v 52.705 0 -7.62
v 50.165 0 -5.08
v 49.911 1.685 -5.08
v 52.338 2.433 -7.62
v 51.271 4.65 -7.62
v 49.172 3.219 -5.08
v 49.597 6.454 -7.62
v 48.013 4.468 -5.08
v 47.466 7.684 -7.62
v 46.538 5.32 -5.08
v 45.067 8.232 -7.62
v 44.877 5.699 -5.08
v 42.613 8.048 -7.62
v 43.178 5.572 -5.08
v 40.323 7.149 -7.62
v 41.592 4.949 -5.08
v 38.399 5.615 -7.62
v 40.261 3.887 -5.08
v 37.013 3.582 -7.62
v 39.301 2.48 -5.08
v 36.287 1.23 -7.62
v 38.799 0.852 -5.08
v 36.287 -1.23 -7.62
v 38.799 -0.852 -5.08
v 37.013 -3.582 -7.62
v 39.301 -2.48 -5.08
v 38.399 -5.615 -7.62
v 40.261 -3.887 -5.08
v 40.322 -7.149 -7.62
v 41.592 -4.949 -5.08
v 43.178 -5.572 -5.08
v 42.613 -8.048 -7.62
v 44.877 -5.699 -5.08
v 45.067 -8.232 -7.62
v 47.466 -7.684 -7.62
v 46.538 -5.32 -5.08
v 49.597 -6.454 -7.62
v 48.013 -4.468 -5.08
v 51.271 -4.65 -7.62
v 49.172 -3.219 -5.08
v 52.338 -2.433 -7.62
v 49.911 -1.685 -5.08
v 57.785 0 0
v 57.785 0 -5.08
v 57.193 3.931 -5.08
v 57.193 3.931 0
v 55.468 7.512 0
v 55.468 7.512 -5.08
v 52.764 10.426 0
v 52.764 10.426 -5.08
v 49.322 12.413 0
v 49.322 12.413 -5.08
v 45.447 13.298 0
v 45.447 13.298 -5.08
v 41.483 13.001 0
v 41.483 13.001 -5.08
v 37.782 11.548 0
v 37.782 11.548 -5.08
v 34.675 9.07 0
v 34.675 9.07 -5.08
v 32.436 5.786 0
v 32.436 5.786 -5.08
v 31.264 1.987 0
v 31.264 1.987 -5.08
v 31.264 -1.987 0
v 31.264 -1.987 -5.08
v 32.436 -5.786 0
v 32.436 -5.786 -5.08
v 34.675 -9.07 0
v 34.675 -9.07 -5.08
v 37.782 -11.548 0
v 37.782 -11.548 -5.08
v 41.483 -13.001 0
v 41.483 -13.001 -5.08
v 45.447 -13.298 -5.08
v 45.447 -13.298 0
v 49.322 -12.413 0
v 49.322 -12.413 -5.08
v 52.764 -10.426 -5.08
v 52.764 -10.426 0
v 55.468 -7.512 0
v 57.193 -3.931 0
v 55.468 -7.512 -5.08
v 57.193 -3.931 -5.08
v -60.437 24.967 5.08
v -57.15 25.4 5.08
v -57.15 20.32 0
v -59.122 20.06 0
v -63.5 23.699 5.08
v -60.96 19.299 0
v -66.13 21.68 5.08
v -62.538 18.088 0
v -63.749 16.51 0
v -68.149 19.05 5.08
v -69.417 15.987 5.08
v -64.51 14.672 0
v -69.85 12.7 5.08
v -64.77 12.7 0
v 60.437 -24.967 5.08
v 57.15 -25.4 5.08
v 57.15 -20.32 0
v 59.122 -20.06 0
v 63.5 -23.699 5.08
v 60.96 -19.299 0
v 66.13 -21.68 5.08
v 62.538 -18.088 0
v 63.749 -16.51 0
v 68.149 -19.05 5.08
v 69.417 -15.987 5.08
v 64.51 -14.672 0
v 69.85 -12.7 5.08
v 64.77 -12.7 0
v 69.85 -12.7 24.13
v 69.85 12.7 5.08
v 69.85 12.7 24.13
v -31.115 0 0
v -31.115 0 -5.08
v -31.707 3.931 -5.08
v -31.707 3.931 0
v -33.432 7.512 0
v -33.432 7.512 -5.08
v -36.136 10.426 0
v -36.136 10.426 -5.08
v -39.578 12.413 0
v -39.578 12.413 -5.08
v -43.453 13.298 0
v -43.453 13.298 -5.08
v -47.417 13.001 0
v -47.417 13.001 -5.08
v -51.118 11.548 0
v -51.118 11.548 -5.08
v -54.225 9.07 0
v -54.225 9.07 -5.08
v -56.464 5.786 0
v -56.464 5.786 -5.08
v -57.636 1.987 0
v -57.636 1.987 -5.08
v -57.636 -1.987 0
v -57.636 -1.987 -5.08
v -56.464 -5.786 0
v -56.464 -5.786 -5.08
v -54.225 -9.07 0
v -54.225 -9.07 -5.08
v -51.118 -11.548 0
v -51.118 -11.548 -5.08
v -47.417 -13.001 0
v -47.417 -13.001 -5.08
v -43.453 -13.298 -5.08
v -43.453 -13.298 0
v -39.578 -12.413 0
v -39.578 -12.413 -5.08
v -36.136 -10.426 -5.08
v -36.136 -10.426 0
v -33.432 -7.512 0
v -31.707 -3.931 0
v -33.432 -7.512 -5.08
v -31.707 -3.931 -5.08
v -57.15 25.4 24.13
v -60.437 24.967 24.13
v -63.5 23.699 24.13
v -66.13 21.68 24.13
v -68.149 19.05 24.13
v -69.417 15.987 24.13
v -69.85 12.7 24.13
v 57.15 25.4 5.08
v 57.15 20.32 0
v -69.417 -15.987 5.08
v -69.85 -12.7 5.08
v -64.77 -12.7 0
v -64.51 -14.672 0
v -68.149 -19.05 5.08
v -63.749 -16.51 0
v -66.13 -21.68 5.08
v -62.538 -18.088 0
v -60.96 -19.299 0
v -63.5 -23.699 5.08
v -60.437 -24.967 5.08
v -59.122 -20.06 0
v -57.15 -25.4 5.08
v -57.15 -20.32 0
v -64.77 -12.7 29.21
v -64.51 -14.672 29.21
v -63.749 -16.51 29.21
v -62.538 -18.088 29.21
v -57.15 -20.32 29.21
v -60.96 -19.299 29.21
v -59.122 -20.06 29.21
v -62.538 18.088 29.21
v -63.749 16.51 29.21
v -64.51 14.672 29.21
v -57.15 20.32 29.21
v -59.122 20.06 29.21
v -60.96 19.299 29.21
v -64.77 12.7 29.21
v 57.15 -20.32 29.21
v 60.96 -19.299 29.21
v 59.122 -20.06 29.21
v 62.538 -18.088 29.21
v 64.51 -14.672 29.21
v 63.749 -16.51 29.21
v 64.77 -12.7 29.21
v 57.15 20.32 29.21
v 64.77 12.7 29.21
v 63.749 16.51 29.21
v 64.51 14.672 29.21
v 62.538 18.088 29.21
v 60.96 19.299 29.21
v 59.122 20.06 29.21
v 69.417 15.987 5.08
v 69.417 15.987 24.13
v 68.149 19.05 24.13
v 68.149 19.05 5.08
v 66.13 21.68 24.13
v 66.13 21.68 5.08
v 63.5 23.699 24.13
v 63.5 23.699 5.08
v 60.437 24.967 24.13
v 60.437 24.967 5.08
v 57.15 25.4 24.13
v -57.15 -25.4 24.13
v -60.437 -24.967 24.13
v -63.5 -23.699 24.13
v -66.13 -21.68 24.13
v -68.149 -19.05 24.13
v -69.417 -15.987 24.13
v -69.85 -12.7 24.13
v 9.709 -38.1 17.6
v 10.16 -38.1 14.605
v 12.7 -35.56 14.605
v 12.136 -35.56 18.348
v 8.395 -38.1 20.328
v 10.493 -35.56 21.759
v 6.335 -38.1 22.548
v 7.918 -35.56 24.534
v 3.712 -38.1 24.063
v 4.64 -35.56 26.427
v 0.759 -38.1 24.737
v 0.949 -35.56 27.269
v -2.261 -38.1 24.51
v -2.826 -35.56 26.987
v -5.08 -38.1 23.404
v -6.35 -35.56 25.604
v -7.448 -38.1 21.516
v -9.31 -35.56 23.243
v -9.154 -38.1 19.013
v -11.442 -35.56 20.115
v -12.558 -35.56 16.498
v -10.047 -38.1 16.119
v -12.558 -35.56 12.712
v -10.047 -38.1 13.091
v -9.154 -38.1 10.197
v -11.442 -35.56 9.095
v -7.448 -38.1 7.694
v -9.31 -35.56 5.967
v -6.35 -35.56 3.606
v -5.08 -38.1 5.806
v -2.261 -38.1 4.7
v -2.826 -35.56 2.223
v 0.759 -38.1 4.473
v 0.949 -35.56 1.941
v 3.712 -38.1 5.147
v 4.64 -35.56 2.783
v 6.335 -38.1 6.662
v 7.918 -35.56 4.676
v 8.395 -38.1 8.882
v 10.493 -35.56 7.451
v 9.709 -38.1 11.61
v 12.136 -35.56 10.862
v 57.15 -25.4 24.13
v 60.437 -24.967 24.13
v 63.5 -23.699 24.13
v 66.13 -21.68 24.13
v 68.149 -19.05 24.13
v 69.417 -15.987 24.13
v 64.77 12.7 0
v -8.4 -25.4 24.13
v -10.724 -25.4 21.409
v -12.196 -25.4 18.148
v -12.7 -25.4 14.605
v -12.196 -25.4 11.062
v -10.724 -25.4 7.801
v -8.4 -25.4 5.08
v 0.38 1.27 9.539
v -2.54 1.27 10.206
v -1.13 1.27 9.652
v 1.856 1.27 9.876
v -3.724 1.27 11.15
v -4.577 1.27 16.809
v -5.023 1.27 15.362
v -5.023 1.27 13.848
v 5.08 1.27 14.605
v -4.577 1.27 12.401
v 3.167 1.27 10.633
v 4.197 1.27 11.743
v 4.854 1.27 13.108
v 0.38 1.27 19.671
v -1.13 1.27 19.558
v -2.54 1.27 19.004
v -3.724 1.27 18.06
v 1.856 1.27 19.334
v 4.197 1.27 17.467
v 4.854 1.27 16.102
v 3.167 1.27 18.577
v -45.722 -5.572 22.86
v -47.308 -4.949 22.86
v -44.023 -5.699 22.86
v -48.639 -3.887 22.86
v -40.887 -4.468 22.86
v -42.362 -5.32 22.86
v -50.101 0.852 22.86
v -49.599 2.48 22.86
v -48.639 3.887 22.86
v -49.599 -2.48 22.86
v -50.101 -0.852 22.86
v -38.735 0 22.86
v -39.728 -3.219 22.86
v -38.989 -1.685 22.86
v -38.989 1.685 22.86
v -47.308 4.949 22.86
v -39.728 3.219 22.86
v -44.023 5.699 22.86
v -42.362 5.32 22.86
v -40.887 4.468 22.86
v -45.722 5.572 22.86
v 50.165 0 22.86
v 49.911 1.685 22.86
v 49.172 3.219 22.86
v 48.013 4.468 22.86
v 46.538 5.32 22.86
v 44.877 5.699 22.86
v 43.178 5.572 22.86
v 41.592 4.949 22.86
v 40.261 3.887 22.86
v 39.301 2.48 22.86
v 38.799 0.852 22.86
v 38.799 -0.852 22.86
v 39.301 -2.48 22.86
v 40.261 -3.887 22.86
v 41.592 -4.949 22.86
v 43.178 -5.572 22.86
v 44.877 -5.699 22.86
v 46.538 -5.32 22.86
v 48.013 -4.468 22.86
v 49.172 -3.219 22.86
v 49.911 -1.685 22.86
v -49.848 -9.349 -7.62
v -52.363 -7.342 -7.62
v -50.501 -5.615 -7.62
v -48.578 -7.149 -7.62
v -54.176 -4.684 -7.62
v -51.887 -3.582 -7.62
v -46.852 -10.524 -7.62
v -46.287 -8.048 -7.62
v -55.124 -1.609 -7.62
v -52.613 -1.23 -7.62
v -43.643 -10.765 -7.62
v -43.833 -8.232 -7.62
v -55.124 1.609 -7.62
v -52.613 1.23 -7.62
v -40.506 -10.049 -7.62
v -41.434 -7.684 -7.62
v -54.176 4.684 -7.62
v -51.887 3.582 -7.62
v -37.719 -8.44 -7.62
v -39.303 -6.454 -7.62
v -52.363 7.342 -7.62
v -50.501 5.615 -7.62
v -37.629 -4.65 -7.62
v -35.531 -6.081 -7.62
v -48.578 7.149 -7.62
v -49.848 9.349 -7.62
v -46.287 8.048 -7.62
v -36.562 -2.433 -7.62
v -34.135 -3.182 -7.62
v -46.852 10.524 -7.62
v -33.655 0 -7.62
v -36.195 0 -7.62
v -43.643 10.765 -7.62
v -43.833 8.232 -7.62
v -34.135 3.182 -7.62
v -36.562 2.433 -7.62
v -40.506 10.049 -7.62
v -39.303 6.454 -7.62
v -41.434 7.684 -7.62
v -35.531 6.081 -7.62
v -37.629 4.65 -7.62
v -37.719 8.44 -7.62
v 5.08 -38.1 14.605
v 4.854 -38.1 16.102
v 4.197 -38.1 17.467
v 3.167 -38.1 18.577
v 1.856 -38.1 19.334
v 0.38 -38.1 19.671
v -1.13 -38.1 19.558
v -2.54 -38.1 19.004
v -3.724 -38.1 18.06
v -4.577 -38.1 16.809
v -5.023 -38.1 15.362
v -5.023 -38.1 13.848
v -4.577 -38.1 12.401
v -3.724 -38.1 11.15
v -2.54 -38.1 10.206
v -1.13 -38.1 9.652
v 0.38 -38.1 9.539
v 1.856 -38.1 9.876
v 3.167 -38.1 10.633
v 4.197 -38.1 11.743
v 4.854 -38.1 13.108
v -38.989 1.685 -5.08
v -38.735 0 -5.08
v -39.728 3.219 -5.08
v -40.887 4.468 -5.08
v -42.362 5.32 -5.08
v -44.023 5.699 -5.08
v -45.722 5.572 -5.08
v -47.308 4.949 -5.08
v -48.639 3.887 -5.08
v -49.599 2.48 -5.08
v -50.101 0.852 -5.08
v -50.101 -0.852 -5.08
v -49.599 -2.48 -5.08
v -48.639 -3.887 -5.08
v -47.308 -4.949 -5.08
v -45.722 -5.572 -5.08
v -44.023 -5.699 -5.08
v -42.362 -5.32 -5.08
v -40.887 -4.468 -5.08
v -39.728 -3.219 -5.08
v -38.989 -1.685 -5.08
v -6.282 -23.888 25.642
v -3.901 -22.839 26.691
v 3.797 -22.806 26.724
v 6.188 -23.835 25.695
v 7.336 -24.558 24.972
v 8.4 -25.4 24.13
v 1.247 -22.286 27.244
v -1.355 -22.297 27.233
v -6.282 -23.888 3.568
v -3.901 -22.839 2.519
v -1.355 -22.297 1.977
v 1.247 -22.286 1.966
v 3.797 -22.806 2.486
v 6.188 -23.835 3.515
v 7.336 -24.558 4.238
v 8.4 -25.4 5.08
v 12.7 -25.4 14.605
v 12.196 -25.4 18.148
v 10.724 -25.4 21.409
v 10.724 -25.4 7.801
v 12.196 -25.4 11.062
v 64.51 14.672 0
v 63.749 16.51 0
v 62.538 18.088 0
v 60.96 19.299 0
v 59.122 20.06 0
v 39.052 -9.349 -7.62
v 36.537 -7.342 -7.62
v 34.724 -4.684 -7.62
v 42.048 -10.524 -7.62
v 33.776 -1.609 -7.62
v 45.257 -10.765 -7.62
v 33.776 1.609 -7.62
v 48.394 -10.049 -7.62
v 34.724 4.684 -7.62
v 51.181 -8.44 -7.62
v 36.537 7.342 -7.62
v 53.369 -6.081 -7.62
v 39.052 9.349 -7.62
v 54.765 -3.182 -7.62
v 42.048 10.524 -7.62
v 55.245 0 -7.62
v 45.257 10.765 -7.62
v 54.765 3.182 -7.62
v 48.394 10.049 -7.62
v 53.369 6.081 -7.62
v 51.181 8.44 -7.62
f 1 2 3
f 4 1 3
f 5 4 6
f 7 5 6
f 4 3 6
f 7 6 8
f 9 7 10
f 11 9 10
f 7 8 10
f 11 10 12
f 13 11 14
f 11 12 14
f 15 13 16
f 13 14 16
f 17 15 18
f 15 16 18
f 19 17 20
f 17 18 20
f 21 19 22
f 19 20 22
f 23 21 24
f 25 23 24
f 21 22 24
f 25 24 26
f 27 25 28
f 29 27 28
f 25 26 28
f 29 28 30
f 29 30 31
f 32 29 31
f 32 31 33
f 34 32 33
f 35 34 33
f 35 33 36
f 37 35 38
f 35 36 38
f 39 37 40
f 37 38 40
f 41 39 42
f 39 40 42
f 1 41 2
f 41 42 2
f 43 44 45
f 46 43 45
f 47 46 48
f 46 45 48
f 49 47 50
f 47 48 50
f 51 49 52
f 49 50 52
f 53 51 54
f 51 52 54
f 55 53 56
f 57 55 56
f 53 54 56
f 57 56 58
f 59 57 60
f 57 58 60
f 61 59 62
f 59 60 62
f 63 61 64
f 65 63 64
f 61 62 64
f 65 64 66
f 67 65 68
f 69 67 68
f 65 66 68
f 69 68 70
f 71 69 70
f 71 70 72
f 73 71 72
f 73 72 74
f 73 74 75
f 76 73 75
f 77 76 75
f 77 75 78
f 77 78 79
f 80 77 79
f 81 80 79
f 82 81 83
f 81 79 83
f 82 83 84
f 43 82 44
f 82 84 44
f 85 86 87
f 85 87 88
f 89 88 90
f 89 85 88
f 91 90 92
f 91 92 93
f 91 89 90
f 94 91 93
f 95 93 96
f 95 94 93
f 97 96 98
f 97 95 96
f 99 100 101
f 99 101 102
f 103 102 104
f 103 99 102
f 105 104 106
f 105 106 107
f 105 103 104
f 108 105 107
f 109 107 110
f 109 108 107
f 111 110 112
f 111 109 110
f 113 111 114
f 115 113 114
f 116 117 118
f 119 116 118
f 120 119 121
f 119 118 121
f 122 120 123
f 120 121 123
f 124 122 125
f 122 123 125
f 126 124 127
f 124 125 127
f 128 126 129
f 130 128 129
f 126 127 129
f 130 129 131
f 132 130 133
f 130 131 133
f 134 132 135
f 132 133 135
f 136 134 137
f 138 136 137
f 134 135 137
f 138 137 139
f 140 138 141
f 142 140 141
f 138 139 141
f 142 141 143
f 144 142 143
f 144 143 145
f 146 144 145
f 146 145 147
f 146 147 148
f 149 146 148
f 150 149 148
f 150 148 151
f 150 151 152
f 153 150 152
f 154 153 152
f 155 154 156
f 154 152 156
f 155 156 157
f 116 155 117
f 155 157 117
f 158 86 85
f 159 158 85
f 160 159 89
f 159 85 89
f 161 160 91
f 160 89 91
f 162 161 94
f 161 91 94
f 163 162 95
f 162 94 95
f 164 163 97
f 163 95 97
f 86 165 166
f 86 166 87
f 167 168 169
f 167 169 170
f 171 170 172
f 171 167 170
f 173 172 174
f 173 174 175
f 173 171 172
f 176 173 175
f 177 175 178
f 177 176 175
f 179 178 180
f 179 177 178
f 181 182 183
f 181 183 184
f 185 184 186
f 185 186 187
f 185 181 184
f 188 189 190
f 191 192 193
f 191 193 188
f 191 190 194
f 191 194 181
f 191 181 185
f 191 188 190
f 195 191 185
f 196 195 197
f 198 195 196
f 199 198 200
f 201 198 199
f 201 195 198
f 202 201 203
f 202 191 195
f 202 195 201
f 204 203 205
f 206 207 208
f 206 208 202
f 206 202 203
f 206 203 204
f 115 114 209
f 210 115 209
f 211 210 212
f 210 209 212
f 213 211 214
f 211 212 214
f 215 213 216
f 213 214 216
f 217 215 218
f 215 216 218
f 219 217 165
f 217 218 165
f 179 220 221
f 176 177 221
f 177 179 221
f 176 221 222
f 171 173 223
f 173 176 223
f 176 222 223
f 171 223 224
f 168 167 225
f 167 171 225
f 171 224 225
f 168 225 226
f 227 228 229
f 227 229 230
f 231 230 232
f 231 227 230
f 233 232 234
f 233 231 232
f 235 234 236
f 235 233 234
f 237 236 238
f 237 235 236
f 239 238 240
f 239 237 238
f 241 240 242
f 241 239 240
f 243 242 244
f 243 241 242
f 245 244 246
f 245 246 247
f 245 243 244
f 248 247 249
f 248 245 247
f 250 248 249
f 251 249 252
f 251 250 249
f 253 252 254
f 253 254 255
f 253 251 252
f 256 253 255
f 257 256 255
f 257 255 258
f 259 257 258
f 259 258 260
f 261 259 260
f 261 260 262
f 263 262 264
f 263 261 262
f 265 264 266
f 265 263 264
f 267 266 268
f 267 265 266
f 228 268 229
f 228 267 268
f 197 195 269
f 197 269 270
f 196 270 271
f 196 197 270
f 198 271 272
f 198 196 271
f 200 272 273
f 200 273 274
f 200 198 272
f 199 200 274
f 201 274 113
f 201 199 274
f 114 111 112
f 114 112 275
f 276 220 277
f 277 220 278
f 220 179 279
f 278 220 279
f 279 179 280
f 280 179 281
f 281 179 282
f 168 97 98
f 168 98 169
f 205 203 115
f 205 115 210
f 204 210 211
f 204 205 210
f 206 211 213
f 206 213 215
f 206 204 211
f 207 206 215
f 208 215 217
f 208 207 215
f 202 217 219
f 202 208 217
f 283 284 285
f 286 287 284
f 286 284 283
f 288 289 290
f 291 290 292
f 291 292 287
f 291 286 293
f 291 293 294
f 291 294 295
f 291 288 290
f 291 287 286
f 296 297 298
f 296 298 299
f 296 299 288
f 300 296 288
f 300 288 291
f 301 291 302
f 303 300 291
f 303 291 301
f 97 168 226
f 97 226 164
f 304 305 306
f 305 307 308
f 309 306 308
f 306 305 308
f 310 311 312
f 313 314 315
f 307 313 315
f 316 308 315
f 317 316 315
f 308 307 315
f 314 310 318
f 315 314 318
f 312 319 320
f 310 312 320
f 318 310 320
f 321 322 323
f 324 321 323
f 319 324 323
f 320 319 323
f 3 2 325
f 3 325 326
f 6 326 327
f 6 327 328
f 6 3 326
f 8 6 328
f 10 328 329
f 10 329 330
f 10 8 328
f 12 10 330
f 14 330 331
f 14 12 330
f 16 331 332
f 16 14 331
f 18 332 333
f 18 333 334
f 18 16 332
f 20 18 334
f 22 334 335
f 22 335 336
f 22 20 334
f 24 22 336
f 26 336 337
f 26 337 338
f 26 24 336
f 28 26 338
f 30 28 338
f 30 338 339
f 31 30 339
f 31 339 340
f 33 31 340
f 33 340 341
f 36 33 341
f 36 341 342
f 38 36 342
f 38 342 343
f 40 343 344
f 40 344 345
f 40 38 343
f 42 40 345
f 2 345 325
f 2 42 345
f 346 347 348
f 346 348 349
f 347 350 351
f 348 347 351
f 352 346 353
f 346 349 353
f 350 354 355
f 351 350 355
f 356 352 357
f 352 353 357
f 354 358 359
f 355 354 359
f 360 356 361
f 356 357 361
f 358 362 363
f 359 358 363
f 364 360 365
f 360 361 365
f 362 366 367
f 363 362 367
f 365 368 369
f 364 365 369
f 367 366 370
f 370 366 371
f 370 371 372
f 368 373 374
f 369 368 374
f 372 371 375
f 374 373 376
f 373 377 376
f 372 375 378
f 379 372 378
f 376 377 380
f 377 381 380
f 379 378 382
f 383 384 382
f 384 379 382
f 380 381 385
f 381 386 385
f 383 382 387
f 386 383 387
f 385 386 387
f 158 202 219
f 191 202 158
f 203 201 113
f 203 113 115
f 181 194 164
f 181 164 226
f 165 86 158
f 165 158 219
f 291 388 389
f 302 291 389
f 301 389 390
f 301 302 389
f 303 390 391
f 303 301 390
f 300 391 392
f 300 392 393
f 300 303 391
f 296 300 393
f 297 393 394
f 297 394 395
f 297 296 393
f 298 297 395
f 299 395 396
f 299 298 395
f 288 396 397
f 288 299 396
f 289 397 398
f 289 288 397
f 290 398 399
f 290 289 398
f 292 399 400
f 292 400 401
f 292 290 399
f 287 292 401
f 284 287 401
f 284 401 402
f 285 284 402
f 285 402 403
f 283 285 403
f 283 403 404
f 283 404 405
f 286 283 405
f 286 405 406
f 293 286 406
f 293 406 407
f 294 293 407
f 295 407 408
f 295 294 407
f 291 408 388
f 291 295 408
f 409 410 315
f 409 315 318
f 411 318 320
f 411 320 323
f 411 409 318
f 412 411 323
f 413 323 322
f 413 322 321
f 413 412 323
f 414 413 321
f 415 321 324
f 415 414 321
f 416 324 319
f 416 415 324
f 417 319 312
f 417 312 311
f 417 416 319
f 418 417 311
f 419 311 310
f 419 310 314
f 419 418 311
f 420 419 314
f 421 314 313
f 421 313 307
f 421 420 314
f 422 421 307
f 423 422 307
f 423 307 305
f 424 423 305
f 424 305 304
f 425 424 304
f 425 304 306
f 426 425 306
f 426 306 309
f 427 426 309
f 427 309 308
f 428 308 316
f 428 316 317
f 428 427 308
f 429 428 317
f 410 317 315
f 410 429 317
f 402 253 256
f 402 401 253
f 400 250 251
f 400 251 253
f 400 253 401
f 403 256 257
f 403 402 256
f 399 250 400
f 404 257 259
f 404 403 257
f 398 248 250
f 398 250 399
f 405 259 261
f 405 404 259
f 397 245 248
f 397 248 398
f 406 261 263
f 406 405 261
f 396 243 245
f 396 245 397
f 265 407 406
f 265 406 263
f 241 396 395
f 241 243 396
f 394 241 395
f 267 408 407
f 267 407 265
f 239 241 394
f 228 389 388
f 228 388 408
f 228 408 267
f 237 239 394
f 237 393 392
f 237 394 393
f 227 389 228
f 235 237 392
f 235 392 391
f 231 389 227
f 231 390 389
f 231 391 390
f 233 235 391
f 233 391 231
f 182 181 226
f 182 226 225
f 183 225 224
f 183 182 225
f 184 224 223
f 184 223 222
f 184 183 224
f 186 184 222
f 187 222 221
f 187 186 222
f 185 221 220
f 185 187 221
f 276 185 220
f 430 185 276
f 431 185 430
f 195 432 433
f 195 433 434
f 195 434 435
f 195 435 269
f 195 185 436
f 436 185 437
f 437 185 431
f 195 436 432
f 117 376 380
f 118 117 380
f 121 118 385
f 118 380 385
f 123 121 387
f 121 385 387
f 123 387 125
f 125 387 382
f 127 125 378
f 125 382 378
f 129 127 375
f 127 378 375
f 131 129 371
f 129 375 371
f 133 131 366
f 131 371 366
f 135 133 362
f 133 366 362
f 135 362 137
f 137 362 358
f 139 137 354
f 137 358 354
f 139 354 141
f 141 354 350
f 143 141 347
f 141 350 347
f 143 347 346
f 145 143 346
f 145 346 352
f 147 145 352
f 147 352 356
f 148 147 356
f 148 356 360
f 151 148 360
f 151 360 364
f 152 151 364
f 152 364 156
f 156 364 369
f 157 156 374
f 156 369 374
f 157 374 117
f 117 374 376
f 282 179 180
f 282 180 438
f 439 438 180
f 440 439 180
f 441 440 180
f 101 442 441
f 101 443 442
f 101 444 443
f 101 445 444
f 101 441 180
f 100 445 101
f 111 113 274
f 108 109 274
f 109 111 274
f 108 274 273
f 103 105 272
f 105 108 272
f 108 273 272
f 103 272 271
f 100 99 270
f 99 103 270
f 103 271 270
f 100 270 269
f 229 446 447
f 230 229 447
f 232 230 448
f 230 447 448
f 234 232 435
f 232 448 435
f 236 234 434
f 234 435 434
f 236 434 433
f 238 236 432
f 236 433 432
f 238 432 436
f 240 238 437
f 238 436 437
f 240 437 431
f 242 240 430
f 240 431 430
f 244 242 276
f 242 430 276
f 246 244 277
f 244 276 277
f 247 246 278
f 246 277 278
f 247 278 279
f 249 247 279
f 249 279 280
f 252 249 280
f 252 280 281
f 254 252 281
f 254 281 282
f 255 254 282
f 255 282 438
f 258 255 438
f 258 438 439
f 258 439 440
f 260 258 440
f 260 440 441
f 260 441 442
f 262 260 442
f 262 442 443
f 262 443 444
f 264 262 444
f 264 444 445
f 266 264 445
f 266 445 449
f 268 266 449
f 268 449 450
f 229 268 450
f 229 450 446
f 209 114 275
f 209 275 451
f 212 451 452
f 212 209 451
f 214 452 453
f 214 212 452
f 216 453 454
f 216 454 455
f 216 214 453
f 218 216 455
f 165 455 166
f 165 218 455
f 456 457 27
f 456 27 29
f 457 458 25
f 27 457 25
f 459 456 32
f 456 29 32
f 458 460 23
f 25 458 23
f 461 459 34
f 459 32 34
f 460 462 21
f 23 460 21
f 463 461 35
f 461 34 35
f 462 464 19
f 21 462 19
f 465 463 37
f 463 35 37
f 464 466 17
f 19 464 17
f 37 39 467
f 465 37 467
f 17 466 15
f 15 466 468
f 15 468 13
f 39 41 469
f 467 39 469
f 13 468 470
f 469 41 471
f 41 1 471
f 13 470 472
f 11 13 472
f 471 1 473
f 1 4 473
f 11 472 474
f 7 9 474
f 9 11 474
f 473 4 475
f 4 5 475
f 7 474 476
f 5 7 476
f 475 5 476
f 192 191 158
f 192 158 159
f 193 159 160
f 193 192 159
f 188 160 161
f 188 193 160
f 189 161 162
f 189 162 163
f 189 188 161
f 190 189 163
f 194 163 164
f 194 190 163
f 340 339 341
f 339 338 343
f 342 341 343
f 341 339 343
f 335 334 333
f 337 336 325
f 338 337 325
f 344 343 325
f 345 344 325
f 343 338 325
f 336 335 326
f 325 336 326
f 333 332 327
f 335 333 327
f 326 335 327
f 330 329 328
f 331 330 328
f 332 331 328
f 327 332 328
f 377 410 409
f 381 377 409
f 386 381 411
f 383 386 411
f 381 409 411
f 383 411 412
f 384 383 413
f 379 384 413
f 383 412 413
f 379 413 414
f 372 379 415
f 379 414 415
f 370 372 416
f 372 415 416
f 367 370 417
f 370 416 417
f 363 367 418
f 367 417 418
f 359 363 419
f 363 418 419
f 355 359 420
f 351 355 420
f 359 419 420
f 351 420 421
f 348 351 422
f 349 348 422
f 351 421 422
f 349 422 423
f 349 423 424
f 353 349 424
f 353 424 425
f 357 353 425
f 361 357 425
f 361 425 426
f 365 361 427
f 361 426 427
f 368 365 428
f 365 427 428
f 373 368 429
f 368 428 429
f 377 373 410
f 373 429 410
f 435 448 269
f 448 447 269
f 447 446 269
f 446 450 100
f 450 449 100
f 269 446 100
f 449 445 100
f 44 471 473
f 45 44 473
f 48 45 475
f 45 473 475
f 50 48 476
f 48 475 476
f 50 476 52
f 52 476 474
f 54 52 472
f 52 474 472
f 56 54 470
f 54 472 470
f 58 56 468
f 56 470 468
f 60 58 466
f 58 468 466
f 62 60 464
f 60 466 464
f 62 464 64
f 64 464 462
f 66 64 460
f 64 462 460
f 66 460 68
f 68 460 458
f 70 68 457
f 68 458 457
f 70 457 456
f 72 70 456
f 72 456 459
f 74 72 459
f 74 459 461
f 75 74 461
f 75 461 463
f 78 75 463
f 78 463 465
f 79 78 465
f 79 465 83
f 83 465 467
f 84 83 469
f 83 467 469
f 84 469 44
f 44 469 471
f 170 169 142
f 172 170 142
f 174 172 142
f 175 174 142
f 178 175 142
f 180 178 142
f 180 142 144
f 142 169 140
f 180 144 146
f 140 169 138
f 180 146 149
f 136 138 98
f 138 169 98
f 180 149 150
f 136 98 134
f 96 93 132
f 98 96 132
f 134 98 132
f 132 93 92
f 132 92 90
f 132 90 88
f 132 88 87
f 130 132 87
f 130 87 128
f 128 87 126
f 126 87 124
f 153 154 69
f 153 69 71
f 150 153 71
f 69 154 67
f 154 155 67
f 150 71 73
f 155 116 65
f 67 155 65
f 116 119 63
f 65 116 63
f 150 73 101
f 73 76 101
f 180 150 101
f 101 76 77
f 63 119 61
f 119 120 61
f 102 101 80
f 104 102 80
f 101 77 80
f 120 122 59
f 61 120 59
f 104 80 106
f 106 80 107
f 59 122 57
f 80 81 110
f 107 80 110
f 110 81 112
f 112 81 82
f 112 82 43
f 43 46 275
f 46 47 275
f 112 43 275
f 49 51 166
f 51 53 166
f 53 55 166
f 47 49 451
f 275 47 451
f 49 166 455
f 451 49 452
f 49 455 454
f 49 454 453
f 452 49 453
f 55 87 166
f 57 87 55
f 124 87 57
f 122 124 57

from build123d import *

# Parameters (mm, degrees)
SKETCH1_W                = 139.7
SKETCH1_H                = 50.8
SKETCH1_R                = 5.715
BOSS_EXTRUDE1_DEPTH      = 22.86
BOSS_EXTRUDE2_START      = 22.86
BOSS_EXTRUDE2_OUTLINE_W  = 139.7
BOSS_EXTRUDE2_OUTLINE_H  = 50.8
BOSS_EXTRUDE2_DEPTH      = 6.35
EXTRUDE_THIN1_START      = -7.62
SKETCH1_4_R              = 13.335
SKETCH1_4_R_2            = 5.715
EXTRUDE_THIN1_DEPTH      = 7.62
FILLET1_R                = 12.7
CHAMFER1_SIZE            = 5.08
CHAMFER3_SIZE            = 2.54
BOSS_EXTRUDE3_DEPTH      = 12.7
BOSS_EXTRUDE3_DEPTH_BACK = 12.7
SKETCH2_R                = 12.7
SKETCH2_R_2              = 5.08
CUT_EXTRUDE1_START       = -26.67
SKETCH2_2_R              = 5.08
CUT_EXTRUDE1_DEPTH       = 26.67
CHAMFER2_SIZE            = 2.54


# Read off the part's stored shape, not the designer's step: Boss-Extrude2
with BuildPart() as part:
    # Sketch1 → Boss-Extrude1 (new body)
    with BuildSketch(Plane.XY):
        Rectangle(SKETCH1_W, SKETCH1_H)
        with Locations((44.45, 0)):
            Circle(SKETCH1_R, mode=Mode.SUBTRACT)
        with Locations((-44.45, 0)):
            Circle(SKETCH1_R, mode=Mode.SUBTRACT)
    extrude(amount=BOSS_EXTRUDE1_DEPTH)

    # Boss-Extrude2 outline → Boss-Extrude2 (add)
    with BuildSketch(Plane.XY.offset(BOSS_EXTRUDE2_START)):
        Rectangle(BOSS_EXTRUDE2_OUTLINE_W, BOSS_EXTRUDE2_OUTLINE_H)
    extrude(amount=BOSS_EXTRUDE2_DEPTH)

    # Sketch1<4> → Extrude-Thin1 (add)
    # profile 1 of 2: a face of its own
    with BuildSketch(Plane.XY.offset(EXTRUDE_THIN1_START)):
        with Locations((44.45, 0)):
            Circle(SKETCH1_4_R)
        with Locations((44.45, 0)):
            Circle(SKETCH1_4_R_2, mode=Mode.SUBTRACT)
    # profile 2 of 2: a face of its own
    with BuildSketch(Plane.XY.offset(EXTRUDE_THIN1_START)):
        with Locations((-44.45, 0)):
            Circle(SKETCH1_4_R)
        with Locations((-44.45, 0)):
            Circle(SKETCH1_4_R_2, mode=Mode.SUBTRACT)
    extrude(amount=EXTRUDE_THIN1_DEPTH)

    # Fillet1
    fillet1_edges = [part.edges().sort_by_distance(p)[0] for p in [
        (-69.85, 25.4, 14.605),
        (69.85, 25.4, 14.605),
        (69.85, -25.4, 14.605),
        (-69.85, -25.4, 14.605),
    ]]
    fillet(fillet1_edges, radius=FILLET1_R)

    # Chamfer1
    chamfer1_edges = [part.edges().sort_by_distance(p)[0] for p in [
        (0, -25.4, 0),
        (0, -25.4, 29.21),
        (-69.85, 0, 0),
        (0, 25.4, 0),
        (69.85, 0, 0),
        (-66.130256121, 21.680256121, 0),
        (66.130256121, 21.680256121, 0),
        (66.130256121, -21.680256121, 0),
        (-66.130256121, -21.680256121, 0),
        (-69.85, 0, 29.21),
        (69.85, 0, 29.21),
        (0, 25.4, 29.21),
        (-66.130256121, 21.680256121, 29.21),
        (66.130256121, 21.680256121, 29.21),
        (66.130256121, -21.680256121, 29.21),
        (-66.130256121, -21.680256121, 29.21),
    ]]
    chamfer(chamfer1_edges, length=CHAMFER1_SIZE)

    # Chamfer3
    chamfer3_edges = [part.edges().sort_by_distance(p)[0] for p in [
        (31.115, 0, -7.62),
        (38.735, 0, -7.62),
        (-57.785, 0, -7.62),
        (-50.165, 0, -7.62),
    ]]
    chamfer(chamfer3_edges, length=CHAMFER3_SIZE)

    # Sketch2 → Boss-Extrude3 (add, two sides: drawn at the far end of the back side and taken through both)
    with BuildSketch(Plane.XZ.offset(25.4).offset(-BOSS_EXTRUDE3_DEPTH_BACK)):
        with Locations((0, 14.605)):
            Circle(SKETCH2_R)
        with Locations((0, 14.605)):
            Circle(SKETCH2_R_2, mode=Mode.SUBTRACT)
    extrude(amount=BOSS_EXTRUDE3_DEPTH + BOSS_EXTRUDE3_DEPTH_BACK)

    # Sketch2<2> → Cut-Extrude1 (cut)
    with BuildSketch(Plane.XZ.offset(25.4).offset(CUT_EXTRUDE1_START)):
        with Locations((0, 14.605)):
            Circle(SKETCH2_2_R)
    extrude(amount=CUT_EXTRUDE1_DEPTH, mode=Mode.SUBTRACT)

    # Chamfer2
    chamfer2_edges = [part.edges().sort_by_distance(p)[0] for p in [
        (-12.7, -38.1, 14.605),
    ]]
    chamfer(chamfer2_edges, length=CHAMFER2_SIZE)


solid = part.part
